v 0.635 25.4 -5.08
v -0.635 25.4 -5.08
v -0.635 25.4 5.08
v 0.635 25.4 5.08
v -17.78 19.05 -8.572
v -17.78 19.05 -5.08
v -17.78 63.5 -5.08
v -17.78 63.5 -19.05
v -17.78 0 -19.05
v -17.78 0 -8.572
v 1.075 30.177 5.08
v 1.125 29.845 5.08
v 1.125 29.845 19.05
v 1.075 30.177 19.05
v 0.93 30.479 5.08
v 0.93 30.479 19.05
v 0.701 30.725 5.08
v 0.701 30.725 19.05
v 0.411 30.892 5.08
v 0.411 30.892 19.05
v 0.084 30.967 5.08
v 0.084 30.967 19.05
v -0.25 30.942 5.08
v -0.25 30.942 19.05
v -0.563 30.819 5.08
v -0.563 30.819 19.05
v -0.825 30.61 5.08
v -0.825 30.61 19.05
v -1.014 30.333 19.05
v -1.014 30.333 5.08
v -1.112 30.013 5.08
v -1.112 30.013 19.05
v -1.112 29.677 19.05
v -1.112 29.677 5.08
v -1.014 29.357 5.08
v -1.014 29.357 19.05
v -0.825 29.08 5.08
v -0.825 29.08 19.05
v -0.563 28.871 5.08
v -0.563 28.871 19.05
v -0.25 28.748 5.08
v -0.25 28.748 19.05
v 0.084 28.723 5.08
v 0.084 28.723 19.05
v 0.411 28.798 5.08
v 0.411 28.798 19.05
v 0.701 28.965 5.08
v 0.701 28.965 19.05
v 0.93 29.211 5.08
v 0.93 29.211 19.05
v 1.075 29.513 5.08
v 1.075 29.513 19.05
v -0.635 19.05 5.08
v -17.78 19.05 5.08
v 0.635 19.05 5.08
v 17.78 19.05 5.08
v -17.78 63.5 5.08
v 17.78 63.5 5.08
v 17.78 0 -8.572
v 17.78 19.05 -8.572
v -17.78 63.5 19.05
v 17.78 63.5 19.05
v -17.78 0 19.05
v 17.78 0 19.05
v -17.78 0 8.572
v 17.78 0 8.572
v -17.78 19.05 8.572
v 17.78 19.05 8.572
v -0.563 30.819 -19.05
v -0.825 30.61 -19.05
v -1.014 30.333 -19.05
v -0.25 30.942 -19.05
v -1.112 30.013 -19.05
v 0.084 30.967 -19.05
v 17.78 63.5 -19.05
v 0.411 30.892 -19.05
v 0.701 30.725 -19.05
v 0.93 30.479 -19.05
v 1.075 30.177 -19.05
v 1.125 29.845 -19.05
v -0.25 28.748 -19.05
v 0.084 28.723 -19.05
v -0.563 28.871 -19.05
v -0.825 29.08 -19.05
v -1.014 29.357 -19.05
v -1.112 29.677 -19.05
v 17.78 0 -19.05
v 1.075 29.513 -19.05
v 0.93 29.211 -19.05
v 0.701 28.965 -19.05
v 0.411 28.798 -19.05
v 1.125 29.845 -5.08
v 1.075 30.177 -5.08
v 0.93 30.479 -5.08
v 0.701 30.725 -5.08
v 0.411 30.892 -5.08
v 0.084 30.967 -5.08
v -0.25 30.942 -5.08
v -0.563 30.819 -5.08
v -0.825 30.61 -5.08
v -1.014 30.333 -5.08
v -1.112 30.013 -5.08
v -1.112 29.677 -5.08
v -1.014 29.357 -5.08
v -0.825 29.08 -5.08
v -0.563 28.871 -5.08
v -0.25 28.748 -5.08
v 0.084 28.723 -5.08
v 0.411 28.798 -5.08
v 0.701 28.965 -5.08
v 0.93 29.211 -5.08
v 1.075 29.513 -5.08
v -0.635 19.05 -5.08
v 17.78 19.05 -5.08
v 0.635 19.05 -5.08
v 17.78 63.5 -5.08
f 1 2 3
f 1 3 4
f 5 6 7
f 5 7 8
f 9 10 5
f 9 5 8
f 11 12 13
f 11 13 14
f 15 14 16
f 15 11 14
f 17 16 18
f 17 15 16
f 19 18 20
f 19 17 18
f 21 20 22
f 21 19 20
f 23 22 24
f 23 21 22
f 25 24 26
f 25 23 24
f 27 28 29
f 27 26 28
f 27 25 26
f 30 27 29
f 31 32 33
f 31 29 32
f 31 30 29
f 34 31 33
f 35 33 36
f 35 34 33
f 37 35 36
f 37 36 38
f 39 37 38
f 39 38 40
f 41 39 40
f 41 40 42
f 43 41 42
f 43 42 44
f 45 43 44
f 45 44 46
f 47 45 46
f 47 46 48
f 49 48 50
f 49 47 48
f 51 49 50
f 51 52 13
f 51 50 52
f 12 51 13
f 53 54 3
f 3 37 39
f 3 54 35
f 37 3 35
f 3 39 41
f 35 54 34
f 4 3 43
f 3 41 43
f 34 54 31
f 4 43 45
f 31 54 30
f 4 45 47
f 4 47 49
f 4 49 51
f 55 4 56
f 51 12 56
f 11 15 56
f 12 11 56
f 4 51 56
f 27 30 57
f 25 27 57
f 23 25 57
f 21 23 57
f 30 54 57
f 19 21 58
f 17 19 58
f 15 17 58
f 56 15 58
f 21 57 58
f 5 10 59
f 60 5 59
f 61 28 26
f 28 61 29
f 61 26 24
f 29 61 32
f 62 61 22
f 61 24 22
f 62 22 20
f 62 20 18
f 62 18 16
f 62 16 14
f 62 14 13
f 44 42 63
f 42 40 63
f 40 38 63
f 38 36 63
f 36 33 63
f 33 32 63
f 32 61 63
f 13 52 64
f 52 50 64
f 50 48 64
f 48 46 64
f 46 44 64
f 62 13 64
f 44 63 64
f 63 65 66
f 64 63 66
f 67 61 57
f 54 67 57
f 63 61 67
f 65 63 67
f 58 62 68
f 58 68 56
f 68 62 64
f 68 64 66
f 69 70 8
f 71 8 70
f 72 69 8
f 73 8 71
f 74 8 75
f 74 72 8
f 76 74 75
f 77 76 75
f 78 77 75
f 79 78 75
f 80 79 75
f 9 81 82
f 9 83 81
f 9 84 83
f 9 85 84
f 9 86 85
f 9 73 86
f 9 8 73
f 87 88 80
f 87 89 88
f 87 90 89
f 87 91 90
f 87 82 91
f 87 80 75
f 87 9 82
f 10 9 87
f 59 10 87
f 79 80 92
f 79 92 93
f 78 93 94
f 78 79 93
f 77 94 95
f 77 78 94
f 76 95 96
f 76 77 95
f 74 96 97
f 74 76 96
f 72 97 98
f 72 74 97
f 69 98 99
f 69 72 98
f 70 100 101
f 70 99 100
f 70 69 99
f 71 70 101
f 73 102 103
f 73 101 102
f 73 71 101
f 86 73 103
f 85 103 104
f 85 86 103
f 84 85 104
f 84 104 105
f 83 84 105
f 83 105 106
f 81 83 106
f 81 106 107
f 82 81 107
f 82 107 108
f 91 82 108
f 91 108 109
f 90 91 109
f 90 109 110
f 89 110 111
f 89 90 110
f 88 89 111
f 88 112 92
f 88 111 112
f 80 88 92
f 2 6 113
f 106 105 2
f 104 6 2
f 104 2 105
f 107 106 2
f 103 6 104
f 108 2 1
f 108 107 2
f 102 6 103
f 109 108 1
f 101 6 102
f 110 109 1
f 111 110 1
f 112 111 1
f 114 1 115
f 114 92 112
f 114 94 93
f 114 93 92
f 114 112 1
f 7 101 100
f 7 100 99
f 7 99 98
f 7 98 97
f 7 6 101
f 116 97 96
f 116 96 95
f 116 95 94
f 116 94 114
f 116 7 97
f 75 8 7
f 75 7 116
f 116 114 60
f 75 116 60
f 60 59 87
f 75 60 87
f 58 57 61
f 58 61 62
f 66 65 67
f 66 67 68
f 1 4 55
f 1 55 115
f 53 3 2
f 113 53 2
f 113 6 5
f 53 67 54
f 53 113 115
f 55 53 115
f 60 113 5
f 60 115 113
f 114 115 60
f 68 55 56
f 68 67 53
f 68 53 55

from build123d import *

# Parameters (mm, degrees)
SKETCH1_W               = 35.56
SKETCH1_H               = 38.1
BOSS_EXTRUDE1_DEPTH     = 63.5
SKETCH3_W               = 35.56
SKETCH3_H               = 10.16
CUT_EXTRUDE1_DEPTH      = 38.1
SKETCH4_W               = 35.56
SKETCH4_H               = 17.145
CUT_EXTRUDE2_DEPTH      = 19.05
SKETCH5_W               = 17.145
SKETCH5_H               = 10.16
CUT_EXTRUDE3_DEPTH      = 47.158865887
CUT_EXTRUDE4_DEPTH      = 71.21848261
CUT_EXTRUDE4_DEPTH_BACK = 71.21848261
SKETCH6_R               = 1.125


with BuildPart() as part:
    # Sketch1 → Boss-Extrude1 (new body)
    with BuildSketch(Plane(origin=(0, 0, 0), x_dir=(1, 0, 0), z_dir=(0, 1, 0))):
        Rectangle(SKETCH1_W, SKETCH1_H)
    extrude(amount=BOSS_EXTRUDE1_DEPTH)

    # Sketch3 → Cut-Extrude1 (cut)
    with BuildSketch(Plane(origin=(0, 63.5, 0), x_dir=(1, 0, 0), z_dir=(0, 1, 0))):
        Rectangle(SKETCH3_W, SKETCH3_H)
    extrude(amount=-CUT_EXTRUDE1_DEPTH, mode=Mode.SUBTRACT)

    # Sketch4 → Cut-Extrude2 (cut)
    with BuildSketch(Plane.XZ):
        Rectangle(SKETCH4_W, SKETCH4_H)
    extrude(amount=-CUT_EXTRUDE2_DEPTH, mode=Mode.SUBTRACT)

    # Sketch5 → Cut-Extrude3 (cut, through all)
    with BuildSketch(Plane(origin=(0, 25.4, 0), x_dir=(1, 0, 0), z_dir=(0, 1, 0))):
        with Locations((-9.2075, 0)):
            Rectangle(SKETCH5_W, SKETCH5_H)
        with Locations((9.2075, 0)):
            Rectangle(SKETCH5_W, SKETCH5_H)
    extrude(amount=-CUT_EXTRUDE3_DEPTH, mode=Mode.SUBTRACT)

    # Sketch6 → Cut-Extrude4 (cut, two sides: drawn at the far end of the back side and taken through both)
    with BuildSketch(Plane.XY.offset(-5.08).offset(-CUT_EXTRUDE4_DEPTH_BACK)):
        with Locations((0, 29.845)):
            Circle(SKETCH6_R)
    extrude(amount=CUT_EXTRUDE4_DEPTH + CUT_EXTRUDE4_DEPTH_BACK, mode=Mode.SUBTRACT)


solid = part.part
